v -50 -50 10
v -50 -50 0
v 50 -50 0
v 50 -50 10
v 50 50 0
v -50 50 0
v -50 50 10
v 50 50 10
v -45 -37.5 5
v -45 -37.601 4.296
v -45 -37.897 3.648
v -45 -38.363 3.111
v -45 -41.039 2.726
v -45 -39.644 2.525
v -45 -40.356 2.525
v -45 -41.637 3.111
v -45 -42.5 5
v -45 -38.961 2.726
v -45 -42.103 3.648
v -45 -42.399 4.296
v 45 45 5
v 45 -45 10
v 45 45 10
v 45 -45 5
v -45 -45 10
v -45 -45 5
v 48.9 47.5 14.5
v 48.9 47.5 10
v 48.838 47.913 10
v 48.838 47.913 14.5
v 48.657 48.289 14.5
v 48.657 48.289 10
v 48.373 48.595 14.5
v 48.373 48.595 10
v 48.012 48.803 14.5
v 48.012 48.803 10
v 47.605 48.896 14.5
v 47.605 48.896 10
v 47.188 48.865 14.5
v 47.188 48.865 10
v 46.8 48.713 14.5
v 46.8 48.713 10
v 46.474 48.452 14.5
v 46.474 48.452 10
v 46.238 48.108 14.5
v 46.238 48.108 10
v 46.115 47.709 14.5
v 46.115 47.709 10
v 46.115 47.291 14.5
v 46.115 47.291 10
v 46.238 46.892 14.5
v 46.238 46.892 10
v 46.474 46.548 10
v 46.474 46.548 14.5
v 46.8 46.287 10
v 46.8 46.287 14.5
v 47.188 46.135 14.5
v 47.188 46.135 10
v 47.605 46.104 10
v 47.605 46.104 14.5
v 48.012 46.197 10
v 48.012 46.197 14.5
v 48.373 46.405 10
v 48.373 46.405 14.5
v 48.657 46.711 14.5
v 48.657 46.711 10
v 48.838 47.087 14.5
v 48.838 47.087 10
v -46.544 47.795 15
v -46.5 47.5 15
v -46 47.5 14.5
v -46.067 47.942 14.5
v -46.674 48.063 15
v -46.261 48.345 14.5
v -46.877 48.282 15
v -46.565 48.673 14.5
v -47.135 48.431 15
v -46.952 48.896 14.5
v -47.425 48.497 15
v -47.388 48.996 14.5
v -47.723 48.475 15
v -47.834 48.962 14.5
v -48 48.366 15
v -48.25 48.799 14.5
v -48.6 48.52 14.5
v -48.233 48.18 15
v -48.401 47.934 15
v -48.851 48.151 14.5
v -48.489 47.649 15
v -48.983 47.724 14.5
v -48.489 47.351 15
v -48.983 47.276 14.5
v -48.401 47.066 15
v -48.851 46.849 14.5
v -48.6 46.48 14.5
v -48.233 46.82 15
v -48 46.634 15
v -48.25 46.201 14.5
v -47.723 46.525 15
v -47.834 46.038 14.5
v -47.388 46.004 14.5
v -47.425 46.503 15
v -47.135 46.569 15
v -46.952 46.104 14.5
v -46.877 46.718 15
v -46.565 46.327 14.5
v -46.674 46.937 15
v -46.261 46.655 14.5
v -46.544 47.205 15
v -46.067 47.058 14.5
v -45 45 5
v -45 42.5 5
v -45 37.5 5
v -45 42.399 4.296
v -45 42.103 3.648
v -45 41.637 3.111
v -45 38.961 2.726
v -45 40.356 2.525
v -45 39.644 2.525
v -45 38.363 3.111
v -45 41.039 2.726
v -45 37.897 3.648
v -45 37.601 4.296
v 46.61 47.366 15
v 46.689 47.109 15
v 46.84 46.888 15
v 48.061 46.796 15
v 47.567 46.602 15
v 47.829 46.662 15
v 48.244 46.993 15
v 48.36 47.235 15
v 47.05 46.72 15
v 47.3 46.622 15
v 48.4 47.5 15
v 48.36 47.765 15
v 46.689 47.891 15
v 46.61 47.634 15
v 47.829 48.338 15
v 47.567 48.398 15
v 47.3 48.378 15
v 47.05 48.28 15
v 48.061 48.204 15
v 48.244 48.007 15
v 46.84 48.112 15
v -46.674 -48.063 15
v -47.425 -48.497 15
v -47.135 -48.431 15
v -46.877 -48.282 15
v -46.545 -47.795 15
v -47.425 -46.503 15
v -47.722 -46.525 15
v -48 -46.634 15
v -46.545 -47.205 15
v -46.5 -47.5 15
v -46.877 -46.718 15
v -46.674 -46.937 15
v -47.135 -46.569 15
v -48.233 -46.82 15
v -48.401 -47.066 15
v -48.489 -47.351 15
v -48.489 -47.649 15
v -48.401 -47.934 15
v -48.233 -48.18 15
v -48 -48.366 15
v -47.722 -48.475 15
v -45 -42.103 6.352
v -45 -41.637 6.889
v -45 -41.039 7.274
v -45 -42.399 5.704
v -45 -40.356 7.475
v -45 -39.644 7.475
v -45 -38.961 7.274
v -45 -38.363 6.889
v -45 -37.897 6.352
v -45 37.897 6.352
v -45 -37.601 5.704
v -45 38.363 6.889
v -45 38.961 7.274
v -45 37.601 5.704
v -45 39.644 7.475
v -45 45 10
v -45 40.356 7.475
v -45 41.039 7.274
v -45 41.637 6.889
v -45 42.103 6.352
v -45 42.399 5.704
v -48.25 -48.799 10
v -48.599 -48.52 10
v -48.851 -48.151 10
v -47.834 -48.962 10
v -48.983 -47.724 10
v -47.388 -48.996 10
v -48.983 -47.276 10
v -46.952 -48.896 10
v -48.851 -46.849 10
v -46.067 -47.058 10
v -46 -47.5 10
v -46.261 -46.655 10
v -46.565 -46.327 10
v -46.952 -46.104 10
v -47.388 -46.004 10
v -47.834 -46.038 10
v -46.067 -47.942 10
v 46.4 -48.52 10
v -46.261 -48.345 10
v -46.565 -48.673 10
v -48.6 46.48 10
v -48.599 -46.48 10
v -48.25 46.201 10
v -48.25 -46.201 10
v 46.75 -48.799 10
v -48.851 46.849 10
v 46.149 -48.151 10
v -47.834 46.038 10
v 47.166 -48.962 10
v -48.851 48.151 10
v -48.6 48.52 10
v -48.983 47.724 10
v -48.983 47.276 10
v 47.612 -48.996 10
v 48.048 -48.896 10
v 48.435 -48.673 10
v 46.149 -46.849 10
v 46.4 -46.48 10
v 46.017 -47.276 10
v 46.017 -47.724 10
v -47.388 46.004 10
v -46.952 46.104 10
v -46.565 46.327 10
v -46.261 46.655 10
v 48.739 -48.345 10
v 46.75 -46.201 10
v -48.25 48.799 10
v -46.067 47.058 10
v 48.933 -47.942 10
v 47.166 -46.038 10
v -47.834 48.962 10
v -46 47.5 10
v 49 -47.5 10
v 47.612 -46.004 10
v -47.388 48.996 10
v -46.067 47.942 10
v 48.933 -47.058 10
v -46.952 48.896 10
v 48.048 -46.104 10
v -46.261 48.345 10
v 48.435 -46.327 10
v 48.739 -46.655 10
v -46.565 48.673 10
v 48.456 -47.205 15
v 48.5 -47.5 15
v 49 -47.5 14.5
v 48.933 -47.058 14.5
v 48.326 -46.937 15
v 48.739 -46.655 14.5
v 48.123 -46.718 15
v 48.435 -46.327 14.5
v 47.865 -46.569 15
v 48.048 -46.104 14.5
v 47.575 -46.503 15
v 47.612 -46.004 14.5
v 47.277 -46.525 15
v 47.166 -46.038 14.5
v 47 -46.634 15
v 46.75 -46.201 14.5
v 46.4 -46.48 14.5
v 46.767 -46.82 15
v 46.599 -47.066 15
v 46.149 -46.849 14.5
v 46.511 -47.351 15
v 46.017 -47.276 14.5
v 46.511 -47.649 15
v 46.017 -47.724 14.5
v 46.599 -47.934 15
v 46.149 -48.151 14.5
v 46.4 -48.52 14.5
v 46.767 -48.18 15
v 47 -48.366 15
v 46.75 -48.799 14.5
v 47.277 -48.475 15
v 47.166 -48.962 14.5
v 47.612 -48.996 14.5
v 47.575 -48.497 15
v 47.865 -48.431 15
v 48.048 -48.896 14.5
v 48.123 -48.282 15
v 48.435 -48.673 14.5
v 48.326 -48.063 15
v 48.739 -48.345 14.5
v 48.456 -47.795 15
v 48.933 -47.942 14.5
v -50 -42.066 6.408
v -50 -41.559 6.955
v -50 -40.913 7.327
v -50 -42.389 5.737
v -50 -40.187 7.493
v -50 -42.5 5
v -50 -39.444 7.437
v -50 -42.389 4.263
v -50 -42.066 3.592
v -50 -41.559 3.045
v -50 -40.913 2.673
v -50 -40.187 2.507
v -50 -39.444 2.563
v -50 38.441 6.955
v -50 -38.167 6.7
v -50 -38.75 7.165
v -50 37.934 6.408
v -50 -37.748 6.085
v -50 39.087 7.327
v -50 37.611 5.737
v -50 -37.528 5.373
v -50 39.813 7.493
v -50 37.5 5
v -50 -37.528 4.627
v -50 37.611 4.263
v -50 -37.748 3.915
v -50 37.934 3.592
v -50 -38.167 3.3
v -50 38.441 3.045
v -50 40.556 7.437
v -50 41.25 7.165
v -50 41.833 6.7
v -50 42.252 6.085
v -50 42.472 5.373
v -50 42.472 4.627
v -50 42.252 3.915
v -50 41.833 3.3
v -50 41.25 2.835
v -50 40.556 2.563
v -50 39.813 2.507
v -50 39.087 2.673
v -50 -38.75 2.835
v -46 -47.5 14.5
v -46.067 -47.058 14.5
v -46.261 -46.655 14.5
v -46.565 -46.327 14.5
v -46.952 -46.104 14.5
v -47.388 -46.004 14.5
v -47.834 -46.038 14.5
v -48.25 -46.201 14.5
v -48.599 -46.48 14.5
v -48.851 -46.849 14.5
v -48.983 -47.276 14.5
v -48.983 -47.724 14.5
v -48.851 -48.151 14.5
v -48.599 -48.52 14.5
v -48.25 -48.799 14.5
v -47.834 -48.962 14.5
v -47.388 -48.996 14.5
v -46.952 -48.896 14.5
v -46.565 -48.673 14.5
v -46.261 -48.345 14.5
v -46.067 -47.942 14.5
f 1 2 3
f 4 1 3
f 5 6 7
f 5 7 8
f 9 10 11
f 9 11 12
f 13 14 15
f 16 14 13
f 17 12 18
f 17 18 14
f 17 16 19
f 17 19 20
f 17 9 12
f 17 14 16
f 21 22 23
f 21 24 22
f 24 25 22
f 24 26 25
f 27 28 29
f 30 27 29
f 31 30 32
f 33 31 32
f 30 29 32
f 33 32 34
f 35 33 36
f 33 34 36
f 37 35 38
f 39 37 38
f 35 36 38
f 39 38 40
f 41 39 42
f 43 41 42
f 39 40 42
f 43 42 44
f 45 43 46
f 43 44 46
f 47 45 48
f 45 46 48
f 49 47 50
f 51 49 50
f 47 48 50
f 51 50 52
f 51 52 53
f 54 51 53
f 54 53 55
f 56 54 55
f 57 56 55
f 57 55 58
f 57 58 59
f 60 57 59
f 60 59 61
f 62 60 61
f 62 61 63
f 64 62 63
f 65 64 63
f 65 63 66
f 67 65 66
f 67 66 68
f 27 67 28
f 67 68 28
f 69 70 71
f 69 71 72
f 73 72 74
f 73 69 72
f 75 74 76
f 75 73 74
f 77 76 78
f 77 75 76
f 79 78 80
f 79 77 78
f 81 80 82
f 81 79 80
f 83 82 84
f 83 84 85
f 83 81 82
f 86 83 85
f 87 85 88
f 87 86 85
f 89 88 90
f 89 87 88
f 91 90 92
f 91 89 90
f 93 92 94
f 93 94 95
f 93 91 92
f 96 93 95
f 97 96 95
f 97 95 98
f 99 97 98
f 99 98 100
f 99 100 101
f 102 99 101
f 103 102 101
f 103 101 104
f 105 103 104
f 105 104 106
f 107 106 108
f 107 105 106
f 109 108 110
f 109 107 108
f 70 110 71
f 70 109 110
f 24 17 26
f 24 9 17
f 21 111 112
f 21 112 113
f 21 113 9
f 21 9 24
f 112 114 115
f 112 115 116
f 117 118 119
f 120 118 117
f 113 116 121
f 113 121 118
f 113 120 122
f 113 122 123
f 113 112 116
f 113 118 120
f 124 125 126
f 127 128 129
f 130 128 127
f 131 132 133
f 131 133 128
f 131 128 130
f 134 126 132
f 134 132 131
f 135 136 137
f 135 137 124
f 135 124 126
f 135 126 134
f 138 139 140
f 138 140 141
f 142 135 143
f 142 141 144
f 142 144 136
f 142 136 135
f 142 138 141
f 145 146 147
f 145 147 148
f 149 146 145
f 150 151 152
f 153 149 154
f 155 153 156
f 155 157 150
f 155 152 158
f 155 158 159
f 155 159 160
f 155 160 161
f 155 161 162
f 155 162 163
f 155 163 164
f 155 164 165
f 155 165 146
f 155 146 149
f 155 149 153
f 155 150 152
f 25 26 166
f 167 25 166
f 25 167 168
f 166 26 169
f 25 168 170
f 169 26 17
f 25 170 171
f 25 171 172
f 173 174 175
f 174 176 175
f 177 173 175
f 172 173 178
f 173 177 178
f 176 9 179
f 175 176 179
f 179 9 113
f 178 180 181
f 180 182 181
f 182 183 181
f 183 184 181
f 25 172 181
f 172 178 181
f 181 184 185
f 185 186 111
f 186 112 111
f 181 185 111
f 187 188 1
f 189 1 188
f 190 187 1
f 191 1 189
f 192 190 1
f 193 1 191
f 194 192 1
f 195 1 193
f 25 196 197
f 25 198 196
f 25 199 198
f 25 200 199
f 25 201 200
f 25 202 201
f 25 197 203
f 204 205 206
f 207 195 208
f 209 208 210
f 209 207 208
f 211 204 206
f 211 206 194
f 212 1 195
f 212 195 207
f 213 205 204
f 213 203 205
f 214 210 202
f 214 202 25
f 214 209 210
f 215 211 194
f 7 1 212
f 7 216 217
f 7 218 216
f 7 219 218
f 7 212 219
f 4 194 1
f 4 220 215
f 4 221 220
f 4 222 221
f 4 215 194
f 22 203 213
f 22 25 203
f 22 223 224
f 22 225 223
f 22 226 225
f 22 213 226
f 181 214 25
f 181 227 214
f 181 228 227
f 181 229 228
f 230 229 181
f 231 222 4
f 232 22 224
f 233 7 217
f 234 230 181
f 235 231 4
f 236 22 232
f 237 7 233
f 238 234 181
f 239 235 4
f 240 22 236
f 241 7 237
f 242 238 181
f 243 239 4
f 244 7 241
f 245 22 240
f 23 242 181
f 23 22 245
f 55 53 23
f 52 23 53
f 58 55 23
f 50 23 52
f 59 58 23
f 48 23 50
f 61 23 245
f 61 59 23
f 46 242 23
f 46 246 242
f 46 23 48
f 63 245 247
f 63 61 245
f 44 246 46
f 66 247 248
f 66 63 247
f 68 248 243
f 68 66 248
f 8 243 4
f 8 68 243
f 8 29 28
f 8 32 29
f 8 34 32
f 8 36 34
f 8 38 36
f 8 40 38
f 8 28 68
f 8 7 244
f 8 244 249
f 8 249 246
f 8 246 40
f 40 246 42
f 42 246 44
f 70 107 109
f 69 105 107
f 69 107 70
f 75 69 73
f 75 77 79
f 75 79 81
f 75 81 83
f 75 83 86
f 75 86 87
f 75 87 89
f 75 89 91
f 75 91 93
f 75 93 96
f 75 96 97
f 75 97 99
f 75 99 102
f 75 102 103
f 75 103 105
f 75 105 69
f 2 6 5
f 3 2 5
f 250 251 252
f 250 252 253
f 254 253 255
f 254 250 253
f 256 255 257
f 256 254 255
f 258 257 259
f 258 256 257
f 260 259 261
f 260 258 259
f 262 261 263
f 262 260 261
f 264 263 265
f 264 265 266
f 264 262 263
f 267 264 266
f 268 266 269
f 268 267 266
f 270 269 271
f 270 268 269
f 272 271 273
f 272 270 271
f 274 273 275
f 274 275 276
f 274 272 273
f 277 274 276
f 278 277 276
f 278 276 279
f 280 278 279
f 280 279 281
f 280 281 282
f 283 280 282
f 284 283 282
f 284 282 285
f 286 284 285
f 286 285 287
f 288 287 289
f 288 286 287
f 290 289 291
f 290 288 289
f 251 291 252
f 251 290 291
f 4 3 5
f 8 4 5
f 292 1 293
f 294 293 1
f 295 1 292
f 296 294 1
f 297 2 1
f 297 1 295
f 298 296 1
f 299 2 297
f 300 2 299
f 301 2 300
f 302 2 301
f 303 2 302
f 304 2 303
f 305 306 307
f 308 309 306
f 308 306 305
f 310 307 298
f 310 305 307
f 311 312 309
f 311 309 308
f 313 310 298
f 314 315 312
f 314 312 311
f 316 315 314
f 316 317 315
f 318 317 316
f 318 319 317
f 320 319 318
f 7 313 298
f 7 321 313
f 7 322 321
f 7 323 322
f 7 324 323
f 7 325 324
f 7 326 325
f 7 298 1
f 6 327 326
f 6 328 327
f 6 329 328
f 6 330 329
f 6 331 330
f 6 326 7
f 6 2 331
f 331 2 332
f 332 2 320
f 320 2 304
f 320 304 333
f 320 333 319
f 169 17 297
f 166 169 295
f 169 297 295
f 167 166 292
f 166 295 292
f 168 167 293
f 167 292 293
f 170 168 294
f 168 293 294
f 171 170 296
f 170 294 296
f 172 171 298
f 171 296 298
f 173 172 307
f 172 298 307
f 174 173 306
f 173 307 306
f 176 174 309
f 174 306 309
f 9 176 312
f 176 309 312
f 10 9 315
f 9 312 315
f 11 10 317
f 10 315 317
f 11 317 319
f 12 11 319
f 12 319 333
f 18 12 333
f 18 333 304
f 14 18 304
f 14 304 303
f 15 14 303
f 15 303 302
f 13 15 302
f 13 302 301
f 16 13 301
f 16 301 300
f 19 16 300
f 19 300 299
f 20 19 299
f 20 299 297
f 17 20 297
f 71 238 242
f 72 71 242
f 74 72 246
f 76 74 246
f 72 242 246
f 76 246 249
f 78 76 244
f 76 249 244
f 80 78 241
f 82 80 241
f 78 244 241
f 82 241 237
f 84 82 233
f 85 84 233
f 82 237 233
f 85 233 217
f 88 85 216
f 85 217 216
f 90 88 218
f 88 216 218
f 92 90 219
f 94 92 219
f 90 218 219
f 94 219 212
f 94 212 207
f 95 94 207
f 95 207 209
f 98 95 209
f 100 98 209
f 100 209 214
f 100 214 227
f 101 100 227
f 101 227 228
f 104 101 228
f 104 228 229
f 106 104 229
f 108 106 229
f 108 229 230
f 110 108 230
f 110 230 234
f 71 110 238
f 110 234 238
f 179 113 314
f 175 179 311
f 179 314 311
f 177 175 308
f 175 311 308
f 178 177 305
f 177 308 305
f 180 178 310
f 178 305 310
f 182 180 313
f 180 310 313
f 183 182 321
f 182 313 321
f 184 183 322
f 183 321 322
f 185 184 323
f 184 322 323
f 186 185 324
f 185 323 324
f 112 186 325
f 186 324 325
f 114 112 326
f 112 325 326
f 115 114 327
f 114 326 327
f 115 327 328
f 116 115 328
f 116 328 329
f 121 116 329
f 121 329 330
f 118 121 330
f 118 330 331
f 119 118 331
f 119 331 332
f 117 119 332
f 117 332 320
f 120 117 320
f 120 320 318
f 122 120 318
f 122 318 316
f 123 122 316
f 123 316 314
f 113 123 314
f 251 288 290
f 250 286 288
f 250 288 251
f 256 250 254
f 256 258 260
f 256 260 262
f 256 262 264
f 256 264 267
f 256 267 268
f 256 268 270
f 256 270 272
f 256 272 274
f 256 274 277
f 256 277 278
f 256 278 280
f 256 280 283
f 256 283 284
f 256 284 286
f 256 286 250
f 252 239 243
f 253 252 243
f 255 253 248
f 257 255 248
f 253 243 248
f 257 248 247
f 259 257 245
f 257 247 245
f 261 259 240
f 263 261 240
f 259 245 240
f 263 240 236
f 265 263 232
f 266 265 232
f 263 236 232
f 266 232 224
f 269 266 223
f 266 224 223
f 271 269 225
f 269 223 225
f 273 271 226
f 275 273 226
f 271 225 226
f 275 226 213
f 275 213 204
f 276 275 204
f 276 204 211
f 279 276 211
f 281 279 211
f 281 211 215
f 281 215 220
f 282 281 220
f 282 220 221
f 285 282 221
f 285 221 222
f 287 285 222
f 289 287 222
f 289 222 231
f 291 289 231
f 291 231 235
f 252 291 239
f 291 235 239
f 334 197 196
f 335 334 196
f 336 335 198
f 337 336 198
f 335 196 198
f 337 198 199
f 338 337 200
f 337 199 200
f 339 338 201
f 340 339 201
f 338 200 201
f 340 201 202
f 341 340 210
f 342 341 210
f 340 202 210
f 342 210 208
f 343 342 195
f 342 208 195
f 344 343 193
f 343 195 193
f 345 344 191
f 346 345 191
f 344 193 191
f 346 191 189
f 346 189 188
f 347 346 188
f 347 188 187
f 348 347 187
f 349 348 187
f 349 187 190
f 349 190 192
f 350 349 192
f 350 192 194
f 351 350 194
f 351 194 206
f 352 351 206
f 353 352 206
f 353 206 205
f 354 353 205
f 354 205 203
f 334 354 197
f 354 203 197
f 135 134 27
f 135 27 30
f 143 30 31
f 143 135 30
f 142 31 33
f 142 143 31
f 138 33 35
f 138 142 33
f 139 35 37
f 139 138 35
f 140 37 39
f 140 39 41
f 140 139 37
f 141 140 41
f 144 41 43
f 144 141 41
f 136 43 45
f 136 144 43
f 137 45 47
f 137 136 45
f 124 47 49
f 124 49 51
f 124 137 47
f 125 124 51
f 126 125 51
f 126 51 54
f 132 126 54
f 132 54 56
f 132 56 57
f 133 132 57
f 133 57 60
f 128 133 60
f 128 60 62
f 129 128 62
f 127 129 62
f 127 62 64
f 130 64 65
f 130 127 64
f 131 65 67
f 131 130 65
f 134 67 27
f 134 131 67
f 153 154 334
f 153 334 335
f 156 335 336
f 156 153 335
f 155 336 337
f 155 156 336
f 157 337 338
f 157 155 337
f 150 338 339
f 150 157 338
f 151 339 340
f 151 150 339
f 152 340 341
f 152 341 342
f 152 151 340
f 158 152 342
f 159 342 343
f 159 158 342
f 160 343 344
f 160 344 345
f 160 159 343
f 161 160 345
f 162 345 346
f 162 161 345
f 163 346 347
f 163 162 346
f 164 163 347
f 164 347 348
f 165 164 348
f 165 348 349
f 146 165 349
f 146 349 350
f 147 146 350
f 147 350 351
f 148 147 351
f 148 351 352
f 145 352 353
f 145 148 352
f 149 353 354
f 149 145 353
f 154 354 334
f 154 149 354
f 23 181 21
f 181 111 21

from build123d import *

# Parameters (mm, degrees)
F0_W     = 100
F0_H     = 100
F1_DEPTH = 10
F2_T     = -5
F3_R     = 1.499724
F3_R_2   = 1.5
F3_R_3   = 1.400261
F4_DEPTH = 5
F5_SIZE  = 0.5
F6_R     = 2.5
F7_DEPTH = 5


with BuildPart() as f1:
    # F0 (on Top) → F1 (new body)
    with BuildSketch(Plane.XY):
        Rectangle(F0_W, F0_H)
    extrude(amount=F1_DEPTH)

    # F2
    f2_openings = [f1.faces().sort_by_distance(p)[0] for p in [
        (0, 0, 10),
    ]]
    offset(amount=F2_T, openings=f2_openings)

    # F3 (on face) → F4 (join)
    with BuildSketch(Plane.XY.offset(10)):
        with Locations((-47.5, -47.5)):
            Circle(F3_R)
        with Locations((47.5, -47.5)):
            Circle(F3_R_2)
        with Locations((47.5, 47.5)):
            Circle(F3_R_3)
        with Locations((-47.5, 47.5)):
            Circle(F3_R_2)
    extrude(amount=F4_DEPTH)

    # F5
    f5_edges = [f1.edges().sort_by_distance(p)[0] for p in [
        (46.099739, 47.5, 15),
        (-49, 47.5, 15),
        (-48.999724, -47.5, 15),
        (46, -47.5, 15),
    ]]
    chamfer(f5_edges, length=F5_SIZE)

    # F6 (on face) → F7 (cut)
    with BuildSketch(Plane(origin=(-50, 0, 0), x_dir=(0, -1, 0), z_dir=(-1, 0, 0))):
        with Locations((40, 5)):
            Circle(F6_R)
        with Locations((-40, 5)):
            Circle(F6_R)
    extrude(amount=-F7_DEPTH, mode=Mode.SUBTRACT)


solid = f1.part
